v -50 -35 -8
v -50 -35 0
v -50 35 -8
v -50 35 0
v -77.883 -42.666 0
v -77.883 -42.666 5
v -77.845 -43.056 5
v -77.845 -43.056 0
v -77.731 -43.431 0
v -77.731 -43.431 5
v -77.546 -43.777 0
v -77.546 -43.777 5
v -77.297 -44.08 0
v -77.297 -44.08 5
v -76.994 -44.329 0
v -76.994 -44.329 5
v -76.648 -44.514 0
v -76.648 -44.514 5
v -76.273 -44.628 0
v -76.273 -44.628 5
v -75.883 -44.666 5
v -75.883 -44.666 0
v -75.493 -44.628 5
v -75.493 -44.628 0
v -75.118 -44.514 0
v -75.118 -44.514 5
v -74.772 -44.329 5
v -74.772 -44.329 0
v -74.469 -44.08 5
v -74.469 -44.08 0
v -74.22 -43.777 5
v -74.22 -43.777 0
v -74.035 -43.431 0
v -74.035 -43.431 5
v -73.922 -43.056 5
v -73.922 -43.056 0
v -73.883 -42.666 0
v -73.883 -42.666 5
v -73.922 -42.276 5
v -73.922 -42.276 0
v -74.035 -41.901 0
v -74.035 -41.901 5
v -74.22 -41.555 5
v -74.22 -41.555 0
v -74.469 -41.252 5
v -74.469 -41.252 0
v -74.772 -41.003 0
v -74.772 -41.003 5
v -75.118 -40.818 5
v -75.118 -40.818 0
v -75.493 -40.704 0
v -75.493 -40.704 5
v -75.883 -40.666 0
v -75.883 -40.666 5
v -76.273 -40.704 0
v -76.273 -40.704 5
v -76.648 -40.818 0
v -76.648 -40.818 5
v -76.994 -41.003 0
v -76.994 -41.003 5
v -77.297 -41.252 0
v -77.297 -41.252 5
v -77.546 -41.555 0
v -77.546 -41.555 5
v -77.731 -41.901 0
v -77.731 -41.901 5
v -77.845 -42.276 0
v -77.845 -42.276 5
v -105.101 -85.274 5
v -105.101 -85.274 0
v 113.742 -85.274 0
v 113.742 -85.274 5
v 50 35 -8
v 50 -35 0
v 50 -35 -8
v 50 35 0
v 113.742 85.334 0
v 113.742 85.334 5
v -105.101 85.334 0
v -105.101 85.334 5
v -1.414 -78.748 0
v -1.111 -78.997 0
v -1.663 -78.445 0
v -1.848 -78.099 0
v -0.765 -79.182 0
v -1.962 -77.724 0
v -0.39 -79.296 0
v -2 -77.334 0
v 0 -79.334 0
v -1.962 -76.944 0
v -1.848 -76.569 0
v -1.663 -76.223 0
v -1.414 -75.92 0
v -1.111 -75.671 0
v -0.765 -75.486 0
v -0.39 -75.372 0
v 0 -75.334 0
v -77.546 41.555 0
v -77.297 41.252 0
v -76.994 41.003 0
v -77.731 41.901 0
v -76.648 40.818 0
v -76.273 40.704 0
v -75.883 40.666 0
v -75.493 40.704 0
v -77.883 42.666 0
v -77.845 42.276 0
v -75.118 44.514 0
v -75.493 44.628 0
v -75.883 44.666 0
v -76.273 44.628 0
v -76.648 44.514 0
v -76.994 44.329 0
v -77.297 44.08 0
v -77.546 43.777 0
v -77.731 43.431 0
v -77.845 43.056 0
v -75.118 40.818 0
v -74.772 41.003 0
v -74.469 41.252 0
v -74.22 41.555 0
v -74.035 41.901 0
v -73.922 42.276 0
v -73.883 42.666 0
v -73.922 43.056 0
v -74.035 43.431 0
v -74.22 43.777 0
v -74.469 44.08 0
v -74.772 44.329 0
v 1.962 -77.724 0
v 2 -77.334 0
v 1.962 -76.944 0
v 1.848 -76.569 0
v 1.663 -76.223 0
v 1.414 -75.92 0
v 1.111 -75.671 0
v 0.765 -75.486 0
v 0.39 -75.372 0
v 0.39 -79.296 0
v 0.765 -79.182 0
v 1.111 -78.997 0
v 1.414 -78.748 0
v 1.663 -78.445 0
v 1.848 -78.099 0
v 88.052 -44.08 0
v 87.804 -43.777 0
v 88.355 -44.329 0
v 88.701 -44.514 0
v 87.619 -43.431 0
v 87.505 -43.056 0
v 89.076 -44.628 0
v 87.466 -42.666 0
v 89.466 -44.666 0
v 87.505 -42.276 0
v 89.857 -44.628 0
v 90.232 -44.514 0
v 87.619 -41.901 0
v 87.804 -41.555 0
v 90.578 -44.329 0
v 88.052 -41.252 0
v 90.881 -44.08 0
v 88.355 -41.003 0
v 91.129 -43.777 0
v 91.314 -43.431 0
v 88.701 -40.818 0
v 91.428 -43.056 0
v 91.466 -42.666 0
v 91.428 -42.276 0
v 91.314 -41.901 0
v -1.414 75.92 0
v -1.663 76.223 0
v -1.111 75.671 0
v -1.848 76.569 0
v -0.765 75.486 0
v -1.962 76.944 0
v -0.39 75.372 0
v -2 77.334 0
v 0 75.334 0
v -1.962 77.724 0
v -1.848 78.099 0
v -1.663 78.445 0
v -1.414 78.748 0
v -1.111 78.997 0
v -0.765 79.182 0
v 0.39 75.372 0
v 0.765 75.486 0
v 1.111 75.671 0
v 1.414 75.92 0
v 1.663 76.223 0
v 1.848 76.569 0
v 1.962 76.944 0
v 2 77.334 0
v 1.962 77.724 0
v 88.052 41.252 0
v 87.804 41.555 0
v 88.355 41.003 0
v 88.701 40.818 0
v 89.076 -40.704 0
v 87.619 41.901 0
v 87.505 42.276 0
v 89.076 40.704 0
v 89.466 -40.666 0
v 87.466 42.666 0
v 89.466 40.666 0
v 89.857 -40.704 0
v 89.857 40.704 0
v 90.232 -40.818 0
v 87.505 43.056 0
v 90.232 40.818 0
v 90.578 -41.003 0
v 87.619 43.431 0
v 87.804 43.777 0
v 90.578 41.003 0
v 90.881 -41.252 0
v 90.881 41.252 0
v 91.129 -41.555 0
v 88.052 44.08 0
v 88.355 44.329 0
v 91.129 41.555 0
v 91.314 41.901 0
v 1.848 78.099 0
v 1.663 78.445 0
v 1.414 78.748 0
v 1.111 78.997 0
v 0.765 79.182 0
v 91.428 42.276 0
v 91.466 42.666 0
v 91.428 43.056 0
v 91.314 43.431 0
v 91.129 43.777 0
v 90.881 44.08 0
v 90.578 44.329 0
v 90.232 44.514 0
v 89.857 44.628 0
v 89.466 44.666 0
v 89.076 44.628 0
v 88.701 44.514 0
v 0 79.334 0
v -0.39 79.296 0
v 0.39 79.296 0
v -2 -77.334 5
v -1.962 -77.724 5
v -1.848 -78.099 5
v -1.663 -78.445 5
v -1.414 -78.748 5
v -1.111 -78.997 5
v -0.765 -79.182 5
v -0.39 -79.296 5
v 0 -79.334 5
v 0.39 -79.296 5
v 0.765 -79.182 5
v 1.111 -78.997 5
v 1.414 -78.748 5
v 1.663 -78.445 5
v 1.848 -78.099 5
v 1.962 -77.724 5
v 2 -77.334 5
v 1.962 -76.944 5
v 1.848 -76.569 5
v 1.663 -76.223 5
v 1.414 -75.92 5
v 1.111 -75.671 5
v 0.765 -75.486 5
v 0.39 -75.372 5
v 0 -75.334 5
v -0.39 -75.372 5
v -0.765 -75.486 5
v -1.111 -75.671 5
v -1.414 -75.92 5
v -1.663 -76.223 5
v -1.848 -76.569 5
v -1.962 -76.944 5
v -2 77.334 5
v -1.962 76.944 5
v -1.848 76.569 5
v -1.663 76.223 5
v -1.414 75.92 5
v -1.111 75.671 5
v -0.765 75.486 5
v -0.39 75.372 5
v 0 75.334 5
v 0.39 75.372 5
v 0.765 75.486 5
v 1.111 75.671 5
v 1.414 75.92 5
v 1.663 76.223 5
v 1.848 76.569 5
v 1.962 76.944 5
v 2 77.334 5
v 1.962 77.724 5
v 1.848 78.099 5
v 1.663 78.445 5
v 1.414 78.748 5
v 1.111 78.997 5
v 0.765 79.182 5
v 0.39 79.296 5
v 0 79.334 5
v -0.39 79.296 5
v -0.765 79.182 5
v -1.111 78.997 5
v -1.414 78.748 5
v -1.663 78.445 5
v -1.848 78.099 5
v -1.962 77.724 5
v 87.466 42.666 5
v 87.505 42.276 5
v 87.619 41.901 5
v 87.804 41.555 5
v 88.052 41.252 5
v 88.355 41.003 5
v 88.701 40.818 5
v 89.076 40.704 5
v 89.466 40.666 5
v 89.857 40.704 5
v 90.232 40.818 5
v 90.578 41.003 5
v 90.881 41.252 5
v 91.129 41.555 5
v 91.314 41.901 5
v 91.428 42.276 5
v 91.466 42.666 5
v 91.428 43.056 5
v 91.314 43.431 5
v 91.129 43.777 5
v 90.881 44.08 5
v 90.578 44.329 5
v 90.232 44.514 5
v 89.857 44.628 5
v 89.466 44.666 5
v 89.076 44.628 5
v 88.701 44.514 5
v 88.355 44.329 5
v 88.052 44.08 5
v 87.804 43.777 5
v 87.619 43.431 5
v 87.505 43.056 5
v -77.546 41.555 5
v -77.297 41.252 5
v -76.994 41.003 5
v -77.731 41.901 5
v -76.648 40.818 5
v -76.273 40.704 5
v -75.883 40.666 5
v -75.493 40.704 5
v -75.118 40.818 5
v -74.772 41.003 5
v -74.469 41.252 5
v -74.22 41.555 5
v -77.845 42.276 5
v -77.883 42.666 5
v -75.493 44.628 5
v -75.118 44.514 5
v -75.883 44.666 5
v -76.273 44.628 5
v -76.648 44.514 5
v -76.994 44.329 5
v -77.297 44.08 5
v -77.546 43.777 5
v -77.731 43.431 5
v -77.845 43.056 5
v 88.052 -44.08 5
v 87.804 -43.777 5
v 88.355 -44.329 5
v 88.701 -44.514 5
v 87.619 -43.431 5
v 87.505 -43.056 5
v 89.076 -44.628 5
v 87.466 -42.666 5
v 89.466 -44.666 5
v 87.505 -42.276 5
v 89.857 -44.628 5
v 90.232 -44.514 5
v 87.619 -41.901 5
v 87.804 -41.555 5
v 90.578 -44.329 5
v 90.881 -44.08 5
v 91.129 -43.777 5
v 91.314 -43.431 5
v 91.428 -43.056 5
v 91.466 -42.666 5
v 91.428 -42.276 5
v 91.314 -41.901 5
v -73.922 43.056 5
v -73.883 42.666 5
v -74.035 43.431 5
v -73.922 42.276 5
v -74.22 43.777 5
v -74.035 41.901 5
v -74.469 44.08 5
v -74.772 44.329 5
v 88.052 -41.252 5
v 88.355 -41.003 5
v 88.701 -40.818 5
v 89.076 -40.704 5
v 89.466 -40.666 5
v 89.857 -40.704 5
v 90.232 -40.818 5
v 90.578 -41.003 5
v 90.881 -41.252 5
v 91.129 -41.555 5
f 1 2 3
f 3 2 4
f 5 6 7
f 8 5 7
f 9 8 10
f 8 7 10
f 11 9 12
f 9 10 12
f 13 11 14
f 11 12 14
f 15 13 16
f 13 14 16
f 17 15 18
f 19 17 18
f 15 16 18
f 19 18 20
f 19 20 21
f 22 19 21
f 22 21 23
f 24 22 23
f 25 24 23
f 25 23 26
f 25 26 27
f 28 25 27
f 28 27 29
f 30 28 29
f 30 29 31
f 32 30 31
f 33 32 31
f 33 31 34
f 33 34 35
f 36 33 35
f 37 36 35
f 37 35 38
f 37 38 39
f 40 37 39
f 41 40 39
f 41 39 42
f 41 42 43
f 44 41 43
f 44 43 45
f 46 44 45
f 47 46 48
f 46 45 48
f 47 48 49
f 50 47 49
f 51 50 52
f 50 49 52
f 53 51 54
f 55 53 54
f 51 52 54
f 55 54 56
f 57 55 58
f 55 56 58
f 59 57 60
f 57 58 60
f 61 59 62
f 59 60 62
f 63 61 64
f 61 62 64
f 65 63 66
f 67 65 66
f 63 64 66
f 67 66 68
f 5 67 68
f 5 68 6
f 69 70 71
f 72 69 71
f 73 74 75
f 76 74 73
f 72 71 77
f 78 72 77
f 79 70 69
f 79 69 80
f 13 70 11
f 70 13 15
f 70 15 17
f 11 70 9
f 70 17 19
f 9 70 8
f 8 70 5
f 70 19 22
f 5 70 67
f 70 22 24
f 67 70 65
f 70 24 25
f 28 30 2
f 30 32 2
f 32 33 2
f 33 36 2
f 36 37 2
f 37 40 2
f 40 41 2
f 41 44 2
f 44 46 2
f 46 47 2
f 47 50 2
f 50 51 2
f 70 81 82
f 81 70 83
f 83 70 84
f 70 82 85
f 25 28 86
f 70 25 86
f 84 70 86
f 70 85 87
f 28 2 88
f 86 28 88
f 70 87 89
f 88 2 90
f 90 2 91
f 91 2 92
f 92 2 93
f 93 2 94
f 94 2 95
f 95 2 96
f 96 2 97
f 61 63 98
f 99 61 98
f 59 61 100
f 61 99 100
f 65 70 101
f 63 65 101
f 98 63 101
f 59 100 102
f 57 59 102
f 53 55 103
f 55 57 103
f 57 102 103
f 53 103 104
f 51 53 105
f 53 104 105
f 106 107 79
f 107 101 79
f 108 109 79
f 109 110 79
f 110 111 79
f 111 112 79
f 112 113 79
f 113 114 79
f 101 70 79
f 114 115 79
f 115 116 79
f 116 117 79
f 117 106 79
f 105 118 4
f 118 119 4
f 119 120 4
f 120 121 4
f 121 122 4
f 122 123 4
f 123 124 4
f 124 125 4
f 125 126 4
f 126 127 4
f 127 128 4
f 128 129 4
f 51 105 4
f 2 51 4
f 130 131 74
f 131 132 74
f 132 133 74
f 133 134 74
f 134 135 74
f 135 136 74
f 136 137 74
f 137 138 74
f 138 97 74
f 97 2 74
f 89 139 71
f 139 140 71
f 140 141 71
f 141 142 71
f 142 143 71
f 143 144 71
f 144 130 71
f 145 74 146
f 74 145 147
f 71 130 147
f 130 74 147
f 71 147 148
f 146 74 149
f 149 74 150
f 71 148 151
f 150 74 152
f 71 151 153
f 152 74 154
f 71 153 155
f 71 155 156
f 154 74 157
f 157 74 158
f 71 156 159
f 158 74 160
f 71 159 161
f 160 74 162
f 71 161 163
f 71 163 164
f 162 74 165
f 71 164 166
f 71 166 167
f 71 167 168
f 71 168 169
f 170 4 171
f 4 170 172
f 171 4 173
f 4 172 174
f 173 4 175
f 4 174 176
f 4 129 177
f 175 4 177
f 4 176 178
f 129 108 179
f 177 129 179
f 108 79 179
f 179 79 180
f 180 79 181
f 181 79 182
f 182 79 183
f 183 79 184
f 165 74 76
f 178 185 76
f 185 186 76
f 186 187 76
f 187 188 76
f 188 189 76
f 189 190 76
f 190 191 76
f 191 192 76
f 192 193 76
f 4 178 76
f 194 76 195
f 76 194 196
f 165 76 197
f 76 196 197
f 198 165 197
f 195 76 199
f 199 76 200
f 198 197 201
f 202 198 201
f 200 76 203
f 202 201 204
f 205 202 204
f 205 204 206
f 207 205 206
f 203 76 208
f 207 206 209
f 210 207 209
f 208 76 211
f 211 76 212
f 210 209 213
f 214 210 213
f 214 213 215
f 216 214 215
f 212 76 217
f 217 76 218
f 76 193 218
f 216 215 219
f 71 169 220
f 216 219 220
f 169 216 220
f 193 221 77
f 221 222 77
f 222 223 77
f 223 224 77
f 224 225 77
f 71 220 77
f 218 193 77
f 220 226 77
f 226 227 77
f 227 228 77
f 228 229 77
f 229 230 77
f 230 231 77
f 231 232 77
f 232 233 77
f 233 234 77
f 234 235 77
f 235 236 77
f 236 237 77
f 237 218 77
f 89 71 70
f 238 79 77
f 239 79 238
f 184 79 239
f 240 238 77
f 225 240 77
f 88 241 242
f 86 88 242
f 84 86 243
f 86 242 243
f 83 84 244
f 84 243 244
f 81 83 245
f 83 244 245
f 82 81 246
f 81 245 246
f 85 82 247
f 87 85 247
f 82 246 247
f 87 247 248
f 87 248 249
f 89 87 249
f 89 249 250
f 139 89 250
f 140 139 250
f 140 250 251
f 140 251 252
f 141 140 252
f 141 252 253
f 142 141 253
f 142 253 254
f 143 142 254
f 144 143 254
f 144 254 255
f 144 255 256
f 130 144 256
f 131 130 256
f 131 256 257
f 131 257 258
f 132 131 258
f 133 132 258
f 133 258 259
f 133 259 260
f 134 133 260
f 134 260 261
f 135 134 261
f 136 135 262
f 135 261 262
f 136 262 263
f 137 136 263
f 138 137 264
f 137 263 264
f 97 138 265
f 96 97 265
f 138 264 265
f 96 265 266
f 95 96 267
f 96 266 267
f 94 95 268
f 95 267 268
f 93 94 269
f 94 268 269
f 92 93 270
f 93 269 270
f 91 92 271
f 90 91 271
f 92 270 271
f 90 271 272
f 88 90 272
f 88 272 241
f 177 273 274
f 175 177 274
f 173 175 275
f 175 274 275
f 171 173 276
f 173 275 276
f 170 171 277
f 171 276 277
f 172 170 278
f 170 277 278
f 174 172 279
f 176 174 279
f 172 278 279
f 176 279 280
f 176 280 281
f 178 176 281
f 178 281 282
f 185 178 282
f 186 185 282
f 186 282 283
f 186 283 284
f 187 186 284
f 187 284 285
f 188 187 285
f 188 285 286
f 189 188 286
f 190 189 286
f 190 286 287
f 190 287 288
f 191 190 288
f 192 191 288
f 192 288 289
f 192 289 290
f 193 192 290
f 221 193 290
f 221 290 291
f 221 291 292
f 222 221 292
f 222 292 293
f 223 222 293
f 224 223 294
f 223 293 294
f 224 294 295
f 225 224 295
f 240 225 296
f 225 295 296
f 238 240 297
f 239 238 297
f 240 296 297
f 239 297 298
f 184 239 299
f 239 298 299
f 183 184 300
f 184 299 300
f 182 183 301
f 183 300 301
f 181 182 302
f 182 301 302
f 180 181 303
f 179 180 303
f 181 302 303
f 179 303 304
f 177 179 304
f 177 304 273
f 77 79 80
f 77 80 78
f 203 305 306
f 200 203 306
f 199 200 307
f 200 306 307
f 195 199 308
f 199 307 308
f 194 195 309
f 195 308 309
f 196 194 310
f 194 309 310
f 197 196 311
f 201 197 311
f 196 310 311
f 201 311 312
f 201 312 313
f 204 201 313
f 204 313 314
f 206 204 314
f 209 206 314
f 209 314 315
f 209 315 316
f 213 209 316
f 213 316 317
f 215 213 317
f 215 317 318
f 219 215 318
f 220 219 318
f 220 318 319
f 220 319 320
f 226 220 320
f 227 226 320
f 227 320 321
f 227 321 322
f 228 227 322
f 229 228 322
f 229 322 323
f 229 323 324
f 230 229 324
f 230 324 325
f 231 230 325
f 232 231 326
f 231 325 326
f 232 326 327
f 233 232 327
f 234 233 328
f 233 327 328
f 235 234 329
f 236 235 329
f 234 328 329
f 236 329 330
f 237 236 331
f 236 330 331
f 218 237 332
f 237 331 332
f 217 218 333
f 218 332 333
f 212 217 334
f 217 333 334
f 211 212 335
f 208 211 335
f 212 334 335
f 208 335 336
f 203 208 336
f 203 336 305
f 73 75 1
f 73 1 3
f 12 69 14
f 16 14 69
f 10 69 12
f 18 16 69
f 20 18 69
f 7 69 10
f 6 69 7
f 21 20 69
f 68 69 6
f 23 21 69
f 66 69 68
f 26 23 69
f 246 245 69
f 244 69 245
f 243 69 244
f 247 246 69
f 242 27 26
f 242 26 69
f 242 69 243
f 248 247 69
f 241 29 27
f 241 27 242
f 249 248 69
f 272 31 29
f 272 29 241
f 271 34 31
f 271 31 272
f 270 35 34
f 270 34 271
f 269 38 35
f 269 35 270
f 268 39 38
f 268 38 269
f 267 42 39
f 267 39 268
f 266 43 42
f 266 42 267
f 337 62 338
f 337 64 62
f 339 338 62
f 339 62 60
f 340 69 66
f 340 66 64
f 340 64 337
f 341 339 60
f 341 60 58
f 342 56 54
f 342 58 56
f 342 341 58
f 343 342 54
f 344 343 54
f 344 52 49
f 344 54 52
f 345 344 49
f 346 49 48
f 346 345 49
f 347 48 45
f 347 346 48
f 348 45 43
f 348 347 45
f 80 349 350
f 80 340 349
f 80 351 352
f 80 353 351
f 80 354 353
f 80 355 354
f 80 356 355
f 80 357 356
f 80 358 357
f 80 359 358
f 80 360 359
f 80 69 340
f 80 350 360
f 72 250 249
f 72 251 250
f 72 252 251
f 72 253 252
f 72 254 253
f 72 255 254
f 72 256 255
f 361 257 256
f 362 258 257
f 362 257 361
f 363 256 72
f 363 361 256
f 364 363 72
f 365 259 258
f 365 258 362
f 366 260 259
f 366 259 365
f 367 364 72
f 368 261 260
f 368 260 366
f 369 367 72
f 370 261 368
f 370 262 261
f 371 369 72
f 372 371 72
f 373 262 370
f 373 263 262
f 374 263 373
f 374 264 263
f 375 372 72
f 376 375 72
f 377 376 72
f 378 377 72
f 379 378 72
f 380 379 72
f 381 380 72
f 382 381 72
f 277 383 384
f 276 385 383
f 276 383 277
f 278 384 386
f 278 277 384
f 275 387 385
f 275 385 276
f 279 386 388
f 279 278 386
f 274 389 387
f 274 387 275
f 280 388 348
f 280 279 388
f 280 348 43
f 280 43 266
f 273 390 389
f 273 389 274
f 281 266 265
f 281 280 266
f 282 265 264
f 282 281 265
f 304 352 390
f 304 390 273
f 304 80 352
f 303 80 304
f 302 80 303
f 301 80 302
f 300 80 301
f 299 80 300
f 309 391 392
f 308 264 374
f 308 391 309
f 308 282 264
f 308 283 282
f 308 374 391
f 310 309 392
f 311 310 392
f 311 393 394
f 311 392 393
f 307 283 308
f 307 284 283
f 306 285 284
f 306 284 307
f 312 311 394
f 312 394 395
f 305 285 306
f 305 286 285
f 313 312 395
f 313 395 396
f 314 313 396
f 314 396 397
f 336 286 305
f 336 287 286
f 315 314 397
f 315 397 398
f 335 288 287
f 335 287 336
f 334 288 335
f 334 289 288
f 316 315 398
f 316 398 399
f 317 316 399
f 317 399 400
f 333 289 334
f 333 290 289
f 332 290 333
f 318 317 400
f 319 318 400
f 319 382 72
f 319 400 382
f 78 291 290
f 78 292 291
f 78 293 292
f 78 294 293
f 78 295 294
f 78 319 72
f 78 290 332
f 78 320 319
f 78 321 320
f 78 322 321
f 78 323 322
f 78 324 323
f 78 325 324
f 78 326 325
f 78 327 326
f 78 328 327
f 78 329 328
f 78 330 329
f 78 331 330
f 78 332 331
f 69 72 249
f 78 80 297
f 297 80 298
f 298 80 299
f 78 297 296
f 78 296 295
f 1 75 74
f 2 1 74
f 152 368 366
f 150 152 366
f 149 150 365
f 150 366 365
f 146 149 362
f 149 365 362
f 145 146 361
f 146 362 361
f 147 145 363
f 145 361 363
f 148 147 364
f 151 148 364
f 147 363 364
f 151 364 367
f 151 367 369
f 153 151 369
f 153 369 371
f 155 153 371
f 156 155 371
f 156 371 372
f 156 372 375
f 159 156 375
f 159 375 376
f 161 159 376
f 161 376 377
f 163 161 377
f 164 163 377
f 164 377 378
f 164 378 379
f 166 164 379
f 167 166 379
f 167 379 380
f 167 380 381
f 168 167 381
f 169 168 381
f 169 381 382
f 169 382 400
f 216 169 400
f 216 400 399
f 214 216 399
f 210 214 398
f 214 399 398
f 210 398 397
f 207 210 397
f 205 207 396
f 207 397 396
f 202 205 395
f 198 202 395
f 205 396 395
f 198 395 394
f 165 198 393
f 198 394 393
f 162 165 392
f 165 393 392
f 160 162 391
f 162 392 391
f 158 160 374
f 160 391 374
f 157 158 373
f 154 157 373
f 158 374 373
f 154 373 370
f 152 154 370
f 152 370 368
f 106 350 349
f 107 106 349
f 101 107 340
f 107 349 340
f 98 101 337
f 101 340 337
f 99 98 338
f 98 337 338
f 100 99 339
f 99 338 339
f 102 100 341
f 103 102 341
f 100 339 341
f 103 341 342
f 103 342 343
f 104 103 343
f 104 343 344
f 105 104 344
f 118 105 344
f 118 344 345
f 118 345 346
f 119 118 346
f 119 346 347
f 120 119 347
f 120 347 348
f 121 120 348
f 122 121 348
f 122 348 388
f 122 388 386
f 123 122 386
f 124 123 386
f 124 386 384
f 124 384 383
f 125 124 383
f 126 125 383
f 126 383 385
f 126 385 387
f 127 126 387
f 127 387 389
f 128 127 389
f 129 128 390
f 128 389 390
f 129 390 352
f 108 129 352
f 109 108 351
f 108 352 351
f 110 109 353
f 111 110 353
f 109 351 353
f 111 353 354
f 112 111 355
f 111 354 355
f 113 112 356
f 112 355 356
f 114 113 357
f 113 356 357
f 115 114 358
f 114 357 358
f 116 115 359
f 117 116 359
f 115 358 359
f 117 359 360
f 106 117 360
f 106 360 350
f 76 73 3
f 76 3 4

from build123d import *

# Parameters (mm, degrees)
F0_W     = 218.84298
F0_H     = 170.608
F1_DEPTH = 5
F2_D     = 4
F3_W     = 70
F3_H     = 8
F4_DEPTH = 50


with BuildPart() as f1:
    # F0 (on Top) → F1 (new body)
    with BuildSketch(Plane.XY):
        with Locations((4.32045, 0.03)):
            Rectangle(F0_W, F0_H)
    extrude(amount=F1_DEPTH)

    # F2 (through all)
    with Locations(Plane(origin=(0, 0, 0), x_dir=(1, 0, 0), z_dir=(0, 0, -1))):
        with Locations((-75.883113, 42.666), (0, 77.334), (89.466453, 42.666), (-75.883113, -42.666), (0, -77.334), (89.466453, -42.666)):
            Hole(F2_D / 2)

    # F3 (on Right) → F4 (join, symmetric)
    with BuildSketch(Plane.YZ):
        with Locations((0, -4)):
            Rectangle(F3_W, F3_H)
    extrude(amount=F4_DEPTH, both=True)


solid = f1.part
